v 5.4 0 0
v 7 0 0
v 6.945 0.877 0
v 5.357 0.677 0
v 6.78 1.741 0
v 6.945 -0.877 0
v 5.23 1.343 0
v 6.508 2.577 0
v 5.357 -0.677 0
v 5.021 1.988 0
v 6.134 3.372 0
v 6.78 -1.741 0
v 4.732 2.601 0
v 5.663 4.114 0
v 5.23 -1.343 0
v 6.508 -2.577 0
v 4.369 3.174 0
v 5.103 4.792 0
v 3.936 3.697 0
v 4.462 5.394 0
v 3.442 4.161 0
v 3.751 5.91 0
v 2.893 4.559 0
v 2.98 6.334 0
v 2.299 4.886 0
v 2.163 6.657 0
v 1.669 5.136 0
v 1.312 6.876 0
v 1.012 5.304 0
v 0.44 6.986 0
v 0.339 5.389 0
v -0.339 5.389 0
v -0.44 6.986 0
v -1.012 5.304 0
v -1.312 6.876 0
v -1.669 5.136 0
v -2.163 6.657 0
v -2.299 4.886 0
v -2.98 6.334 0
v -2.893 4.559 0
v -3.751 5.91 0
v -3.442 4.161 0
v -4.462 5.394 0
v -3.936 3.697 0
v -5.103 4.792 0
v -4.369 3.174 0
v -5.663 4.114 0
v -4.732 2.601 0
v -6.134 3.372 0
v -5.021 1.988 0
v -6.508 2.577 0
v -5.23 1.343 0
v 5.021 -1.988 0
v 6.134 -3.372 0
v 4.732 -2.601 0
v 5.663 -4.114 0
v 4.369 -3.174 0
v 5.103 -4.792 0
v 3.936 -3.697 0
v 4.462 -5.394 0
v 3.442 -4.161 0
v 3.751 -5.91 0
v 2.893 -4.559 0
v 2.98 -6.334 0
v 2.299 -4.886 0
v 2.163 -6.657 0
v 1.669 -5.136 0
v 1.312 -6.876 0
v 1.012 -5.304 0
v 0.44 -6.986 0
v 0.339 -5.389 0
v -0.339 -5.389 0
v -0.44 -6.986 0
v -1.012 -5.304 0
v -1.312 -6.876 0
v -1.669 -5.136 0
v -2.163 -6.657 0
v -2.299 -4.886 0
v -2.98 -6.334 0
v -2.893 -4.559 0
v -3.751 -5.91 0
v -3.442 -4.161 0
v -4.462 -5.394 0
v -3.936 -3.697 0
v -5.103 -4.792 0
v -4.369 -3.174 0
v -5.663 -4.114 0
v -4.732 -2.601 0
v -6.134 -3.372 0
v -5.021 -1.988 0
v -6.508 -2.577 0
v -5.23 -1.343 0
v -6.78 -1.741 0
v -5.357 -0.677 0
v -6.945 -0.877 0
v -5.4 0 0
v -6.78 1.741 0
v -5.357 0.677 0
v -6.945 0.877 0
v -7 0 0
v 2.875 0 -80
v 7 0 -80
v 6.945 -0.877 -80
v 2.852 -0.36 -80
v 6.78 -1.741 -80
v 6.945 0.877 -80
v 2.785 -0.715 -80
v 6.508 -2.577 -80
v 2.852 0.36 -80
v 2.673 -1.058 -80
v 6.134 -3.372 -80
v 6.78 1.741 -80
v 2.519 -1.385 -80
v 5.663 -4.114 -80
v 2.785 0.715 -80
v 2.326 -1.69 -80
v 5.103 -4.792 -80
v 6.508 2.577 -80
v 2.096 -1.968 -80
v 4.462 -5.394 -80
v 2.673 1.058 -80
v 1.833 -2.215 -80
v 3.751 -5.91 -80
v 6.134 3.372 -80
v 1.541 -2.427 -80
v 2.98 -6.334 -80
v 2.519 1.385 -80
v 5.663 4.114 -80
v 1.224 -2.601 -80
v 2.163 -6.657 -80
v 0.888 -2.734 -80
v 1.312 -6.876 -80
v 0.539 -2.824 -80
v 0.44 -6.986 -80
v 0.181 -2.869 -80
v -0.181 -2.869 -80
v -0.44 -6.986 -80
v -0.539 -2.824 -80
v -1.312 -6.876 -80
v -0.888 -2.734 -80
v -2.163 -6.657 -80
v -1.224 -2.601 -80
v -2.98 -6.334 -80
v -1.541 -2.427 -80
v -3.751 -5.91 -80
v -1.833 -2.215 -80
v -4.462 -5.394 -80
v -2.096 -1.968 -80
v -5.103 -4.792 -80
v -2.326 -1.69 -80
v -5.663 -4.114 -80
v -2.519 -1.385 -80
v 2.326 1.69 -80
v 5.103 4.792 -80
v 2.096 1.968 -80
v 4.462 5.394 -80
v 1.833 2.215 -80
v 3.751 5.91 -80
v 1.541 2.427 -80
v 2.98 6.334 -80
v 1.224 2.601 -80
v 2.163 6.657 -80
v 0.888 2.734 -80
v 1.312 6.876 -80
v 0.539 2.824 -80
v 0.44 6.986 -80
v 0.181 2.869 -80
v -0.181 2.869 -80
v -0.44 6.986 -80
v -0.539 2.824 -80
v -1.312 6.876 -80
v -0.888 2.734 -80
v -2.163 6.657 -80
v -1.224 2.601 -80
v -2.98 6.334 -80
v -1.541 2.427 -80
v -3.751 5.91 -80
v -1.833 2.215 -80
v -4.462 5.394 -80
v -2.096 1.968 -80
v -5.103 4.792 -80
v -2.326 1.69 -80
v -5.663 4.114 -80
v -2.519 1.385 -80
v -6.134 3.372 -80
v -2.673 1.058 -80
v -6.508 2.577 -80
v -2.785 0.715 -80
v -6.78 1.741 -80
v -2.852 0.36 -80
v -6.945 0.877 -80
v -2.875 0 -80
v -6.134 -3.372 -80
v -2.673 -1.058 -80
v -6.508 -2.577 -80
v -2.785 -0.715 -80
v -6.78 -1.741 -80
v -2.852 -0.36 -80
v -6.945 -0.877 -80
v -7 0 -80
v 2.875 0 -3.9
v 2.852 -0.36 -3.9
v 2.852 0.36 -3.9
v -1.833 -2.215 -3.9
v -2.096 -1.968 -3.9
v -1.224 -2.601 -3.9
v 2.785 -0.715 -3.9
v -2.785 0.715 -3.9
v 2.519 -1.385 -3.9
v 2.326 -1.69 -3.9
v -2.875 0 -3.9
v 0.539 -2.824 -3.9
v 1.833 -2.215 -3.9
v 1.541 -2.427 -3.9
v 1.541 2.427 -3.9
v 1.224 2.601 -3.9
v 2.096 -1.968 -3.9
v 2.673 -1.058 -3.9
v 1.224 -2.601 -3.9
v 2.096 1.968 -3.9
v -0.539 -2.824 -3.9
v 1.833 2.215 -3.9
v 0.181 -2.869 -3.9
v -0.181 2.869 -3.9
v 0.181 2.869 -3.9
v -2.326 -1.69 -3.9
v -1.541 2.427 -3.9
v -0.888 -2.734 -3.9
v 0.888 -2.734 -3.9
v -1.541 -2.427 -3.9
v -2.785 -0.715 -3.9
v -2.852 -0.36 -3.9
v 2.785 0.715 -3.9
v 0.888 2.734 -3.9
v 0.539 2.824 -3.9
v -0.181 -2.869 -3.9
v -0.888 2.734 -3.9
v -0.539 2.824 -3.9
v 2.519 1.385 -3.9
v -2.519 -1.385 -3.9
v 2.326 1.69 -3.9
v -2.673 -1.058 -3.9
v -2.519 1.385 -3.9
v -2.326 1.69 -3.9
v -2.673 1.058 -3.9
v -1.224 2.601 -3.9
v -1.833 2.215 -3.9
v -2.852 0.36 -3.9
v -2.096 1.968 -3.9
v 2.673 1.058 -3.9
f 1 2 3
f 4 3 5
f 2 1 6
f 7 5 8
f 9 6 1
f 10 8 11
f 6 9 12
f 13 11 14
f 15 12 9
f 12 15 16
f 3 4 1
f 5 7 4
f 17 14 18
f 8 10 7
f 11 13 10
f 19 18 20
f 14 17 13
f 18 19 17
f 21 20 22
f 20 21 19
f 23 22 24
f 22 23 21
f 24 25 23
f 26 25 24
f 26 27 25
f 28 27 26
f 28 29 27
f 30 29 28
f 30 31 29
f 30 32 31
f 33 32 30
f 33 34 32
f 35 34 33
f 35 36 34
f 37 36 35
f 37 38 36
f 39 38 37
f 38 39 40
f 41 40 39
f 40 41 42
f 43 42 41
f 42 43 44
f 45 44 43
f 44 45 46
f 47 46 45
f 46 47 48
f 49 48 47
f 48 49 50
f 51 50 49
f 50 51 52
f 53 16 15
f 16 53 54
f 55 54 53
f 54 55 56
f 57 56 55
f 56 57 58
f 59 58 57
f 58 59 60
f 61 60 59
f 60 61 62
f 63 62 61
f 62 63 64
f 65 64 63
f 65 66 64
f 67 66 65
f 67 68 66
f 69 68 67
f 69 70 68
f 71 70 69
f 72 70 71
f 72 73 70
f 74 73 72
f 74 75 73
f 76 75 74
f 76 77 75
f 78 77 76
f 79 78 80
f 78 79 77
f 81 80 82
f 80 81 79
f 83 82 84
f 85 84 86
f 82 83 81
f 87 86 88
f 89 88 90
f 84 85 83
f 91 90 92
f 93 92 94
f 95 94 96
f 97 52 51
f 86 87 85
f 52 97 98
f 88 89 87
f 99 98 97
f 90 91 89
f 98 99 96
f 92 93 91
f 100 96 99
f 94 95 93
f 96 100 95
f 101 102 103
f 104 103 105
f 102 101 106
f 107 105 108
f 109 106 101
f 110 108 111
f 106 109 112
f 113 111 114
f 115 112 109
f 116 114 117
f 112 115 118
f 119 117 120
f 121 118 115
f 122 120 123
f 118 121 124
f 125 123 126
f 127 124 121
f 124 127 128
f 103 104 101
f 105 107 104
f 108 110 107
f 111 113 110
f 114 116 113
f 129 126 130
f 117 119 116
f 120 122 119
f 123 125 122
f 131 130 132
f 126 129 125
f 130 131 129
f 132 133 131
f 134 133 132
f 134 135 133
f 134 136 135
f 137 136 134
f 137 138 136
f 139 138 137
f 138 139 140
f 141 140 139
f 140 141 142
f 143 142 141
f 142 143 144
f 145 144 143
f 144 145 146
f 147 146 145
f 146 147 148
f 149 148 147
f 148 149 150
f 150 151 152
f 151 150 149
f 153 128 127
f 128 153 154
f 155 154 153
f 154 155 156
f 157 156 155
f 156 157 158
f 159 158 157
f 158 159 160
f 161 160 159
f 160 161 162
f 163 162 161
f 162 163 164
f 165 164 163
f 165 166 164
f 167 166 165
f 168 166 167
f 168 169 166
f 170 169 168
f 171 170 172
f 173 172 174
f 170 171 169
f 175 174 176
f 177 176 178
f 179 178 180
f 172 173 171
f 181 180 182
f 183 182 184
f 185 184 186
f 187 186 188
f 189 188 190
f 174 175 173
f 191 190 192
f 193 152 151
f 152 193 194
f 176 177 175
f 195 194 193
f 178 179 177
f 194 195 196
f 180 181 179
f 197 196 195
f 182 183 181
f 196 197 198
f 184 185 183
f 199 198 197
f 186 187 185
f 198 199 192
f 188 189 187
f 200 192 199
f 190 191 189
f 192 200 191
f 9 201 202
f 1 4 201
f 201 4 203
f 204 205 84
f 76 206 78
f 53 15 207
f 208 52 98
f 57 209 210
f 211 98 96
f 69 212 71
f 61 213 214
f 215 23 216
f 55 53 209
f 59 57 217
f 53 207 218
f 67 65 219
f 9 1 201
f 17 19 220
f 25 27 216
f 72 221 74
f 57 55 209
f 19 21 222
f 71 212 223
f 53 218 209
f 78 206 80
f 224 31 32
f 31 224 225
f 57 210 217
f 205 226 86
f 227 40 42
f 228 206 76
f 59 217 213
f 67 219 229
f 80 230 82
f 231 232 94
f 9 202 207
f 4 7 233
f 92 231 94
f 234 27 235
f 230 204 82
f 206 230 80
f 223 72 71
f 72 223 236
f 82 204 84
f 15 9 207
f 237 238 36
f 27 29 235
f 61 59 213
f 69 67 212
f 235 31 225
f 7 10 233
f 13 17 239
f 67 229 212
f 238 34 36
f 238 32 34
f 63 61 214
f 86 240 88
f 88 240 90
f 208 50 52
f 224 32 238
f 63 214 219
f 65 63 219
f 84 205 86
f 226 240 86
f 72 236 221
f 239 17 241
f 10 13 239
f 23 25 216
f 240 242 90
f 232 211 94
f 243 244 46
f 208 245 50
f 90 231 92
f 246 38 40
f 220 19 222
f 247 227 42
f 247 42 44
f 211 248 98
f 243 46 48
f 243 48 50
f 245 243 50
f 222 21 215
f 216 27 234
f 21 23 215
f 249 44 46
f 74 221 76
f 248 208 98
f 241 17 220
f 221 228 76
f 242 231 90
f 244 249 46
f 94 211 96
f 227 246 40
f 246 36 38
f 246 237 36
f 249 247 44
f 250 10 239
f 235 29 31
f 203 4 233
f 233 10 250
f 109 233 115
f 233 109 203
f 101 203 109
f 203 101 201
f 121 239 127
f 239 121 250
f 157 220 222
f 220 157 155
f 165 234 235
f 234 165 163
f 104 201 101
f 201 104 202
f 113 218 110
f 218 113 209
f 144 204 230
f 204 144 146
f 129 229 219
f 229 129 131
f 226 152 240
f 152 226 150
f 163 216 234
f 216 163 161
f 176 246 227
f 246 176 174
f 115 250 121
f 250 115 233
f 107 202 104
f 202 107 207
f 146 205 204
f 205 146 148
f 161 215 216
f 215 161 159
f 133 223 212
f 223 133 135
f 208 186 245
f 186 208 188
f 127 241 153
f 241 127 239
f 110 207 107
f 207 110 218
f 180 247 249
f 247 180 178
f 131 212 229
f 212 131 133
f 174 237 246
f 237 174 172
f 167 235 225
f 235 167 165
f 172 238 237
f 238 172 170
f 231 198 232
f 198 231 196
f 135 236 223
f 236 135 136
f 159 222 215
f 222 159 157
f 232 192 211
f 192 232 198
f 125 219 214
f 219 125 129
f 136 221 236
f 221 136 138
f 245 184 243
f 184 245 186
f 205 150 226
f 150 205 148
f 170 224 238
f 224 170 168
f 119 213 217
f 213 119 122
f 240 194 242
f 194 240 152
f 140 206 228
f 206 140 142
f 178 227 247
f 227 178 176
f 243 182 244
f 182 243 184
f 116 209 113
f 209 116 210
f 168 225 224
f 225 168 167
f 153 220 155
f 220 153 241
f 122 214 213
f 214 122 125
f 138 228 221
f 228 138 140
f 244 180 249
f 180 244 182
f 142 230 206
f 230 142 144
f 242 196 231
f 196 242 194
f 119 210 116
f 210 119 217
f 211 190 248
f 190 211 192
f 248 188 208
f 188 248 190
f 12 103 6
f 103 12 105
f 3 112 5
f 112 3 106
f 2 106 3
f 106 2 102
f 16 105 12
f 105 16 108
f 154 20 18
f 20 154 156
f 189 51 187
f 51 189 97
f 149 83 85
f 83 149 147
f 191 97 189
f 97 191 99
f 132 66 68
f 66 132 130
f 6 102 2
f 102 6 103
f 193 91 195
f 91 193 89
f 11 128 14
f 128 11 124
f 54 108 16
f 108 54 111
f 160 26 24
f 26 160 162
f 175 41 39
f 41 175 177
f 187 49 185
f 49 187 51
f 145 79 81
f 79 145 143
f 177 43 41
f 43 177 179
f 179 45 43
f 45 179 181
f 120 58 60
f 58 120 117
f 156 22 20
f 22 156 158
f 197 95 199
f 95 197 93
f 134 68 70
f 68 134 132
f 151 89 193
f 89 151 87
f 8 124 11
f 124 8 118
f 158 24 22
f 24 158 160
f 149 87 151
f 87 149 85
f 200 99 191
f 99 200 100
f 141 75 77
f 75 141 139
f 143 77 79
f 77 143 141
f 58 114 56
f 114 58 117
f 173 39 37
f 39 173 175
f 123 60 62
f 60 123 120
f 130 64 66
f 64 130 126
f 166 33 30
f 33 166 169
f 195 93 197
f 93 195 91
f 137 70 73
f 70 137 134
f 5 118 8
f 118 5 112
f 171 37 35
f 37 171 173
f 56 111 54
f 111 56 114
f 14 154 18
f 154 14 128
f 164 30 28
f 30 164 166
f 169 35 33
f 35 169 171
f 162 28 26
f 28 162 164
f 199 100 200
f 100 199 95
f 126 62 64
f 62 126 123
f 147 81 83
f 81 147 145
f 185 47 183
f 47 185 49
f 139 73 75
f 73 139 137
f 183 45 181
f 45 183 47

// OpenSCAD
$fn = 50;


difference() {
	union() {
		translate(v = [0, 0, -80.0000000000]) {
			cylinder(h = 80, r = 7.0000000000);
		}
	}
	union() {
		translate(v = [0, 0, 0]) {
			rotate(a = [0, 0, 0]) {
				difference() {
					union() {
						#translate(v = [0, 0, -80.0000000000]) {
							cylinder(h = 80, r = 2.6000000000);
						}
						#translate(v = [0, 0, -3.9000000000]) {
							cylinder(h = 3.9000000000, r = 7.0000000000, r1 = 2.8750000000, r2 = 5.4000000000);
						}
						#translate(v = [0, 0, -80.0000000000]) {
							cylinder(h = 80, r = 2.8750000000);
						}
						#translate(v = [0, 0, -80.0000000000]) {
							cylinder(h = 80, r = 2.6000000000);
						}
					}
					union();
				}
			}
		}
	}
}
